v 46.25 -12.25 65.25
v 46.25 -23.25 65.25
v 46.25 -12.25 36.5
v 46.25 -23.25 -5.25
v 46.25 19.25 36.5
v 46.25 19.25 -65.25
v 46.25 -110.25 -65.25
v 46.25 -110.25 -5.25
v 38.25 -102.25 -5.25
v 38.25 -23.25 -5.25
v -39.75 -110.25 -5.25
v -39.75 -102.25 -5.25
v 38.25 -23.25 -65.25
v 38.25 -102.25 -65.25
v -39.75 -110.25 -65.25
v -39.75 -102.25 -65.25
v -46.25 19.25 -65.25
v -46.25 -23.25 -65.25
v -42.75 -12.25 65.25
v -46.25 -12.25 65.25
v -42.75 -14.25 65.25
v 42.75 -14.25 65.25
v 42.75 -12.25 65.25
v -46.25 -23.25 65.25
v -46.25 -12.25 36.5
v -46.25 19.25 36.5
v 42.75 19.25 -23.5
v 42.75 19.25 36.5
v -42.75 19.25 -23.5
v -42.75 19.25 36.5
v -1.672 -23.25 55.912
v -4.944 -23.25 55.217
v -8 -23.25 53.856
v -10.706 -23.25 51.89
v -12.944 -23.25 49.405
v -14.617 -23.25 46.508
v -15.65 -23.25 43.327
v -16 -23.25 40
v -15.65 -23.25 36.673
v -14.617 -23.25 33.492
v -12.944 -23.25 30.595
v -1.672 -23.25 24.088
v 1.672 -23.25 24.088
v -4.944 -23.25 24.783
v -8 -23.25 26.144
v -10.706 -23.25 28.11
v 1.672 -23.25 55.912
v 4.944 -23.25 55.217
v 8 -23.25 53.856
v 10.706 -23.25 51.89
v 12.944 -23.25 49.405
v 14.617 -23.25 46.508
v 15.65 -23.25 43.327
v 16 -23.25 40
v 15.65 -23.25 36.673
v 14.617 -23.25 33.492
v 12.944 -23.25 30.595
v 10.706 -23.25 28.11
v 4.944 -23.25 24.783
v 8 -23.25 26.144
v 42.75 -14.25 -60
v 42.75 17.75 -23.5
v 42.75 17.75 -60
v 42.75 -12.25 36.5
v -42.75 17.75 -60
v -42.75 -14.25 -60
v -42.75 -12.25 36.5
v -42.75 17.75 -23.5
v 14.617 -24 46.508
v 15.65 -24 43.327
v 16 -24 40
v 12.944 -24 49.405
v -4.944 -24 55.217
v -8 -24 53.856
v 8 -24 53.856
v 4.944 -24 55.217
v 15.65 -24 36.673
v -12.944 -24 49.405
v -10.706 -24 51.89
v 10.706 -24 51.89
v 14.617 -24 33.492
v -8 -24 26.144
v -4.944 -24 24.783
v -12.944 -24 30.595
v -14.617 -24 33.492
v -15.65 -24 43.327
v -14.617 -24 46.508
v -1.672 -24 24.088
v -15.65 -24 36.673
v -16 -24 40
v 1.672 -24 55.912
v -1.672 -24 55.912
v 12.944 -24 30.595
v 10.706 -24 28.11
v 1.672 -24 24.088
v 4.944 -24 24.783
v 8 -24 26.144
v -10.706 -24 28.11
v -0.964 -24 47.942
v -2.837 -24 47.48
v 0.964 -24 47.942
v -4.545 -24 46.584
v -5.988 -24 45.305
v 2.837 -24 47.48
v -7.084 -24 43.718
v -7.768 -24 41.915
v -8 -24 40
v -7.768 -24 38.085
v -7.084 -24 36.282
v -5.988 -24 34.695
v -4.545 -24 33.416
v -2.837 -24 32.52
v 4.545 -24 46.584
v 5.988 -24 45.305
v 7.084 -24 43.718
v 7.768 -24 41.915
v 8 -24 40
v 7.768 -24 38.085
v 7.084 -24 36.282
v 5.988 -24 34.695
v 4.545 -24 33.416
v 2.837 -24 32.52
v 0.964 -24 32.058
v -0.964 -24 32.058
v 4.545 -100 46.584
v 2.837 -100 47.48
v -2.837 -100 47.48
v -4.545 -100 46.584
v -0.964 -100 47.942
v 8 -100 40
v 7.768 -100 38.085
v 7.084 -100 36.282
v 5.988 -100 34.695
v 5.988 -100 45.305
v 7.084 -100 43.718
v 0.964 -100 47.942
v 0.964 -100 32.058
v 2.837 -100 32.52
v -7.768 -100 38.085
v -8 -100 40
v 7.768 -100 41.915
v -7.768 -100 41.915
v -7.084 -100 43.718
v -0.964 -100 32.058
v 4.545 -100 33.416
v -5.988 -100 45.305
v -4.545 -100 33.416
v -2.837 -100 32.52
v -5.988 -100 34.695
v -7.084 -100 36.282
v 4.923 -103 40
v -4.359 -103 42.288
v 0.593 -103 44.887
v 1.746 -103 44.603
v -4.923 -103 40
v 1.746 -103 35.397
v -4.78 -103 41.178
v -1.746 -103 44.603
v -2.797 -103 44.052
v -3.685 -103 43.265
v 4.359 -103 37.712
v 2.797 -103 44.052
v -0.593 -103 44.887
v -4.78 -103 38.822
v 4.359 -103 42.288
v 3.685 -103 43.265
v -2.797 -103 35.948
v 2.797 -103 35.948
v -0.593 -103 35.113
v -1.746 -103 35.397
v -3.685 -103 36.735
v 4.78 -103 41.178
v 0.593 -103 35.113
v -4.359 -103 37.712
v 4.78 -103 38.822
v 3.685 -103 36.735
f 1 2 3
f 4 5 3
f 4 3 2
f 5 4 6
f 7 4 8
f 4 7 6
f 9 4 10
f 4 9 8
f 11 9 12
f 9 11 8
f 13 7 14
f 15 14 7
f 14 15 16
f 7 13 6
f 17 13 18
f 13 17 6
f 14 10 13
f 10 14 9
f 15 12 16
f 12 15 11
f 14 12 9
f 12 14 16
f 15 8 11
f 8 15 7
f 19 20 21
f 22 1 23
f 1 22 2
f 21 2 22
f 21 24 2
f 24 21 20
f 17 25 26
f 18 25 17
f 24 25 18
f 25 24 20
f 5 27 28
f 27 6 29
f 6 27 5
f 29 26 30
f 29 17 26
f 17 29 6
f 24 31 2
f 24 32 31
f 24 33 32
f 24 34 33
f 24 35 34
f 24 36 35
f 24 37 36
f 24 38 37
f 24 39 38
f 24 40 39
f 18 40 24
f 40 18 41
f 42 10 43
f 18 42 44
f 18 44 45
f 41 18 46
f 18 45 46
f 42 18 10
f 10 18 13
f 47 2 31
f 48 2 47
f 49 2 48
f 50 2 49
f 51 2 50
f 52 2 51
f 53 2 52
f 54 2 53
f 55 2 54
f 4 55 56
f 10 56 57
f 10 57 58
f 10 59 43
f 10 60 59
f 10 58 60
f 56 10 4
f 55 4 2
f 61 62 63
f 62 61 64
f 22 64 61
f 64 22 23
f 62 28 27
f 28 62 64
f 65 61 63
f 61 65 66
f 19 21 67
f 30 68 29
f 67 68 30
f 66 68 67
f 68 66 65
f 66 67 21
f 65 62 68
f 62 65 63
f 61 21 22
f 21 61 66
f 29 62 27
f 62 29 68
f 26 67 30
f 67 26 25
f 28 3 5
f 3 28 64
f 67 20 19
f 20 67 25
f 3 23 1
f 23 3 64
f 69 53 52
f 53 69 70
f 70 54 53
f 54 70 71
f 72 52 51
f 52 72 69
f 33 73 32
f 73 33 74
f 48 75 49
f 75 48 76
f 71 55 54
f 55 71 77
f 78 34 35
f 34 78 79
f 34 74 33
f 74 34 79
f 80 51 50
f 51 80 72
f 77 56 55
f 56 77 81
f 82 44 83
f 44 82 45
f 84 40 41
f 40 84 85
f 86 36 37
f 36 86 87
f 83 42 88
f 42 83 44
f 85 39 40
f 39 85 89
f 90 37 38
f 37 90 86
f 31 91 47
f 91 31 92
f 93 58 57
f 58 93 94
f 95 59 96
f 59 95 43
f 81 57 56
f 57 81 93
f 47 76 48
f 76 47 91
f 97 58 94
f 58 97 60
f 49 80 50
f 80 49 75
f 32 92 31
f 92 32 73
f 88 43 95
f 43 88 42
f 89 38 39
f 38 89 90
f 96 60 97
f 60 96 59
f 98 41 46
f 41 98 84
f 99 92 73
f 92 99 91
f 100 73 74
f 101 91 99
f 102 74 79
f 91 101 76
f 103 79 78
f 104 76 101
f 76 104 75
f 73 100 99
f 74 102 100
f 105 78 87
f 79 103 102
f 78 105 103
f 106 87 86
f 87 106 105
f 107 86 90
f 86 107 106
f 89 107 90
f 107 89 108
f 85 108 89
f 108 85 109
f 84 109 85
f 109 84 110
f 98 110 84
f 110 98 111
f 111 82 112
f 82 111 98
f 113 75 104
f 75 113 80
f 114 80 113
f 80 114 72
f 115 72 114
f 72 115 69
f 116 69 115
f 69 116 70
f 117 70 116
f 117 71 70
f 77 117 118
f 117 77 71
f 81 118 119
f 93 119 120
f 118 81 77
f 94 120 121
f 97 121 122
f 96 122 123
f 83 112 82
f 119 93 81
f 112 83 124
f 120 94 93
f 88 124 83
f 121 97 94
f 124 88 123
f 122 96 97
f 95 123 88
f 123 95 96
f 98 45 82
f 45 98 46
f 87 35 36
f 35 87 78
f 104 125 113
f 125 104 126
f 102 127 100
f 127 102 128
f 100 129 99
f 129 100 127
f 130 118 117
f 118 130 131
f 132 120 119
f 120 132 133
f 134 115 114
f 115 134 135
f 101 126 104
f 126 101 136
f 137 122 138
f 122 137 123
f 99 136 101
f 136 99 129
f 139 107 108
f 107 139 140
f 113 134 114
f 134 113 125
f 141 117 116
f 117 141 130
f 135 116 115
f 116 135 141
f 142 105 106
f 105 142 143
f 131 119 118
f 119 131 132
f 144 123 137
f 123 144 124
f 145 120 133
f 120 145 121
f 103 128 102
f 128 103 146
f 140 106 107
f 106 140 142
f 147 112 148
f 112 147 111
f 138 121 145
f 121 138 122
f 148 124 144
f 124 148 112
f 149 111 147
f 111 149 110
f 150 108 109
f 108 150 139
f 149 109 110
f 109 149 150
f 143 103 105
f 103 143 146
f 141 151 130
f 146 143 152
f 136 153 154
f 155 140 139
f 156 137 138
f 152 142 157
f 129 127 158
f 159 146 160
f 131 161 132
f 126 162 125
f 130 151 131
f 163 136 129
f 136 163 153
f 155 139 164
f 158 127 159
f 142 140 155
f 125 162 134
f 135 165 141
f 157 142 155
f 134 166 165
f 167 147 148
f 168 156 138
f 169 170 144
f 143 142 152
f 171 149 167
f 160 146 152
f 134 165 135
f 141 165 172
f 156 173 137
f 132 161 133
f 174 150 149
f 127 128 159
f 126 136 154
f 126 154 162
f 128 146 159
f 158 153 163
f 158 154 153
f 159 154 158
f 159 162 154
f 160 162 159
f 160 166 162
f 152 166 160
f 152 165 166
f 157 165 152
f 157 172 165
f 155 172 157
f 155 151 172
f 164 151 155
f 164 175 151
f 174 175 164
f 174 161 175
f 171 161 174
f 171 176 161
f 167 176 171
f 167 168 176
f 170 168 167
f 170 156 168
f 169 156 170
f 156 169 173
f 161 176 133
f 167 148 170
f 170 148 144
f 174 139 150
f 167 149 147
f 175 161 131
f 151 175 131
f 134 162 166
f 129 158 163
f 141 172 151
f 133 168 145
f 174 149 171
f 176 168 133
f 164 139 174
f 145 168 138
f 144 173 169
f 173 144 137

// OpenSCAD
postWidth=78;
holeDiameter=16;
phoneWidth=85.5;
phoneHeight=127;
phoneDepth=32;
holderWidth=3.5;

union() {
    rackMount();
    phoneHolder();
        
    translate([0, -22, 40])
    rotate([90, 0, 0])
    post();
}

module rackMount() {
    bracketWidth=8;
    bracketHeight=60;
    bracketDepth=10;
    
    union() {
        translate([phoneWidth/2 - bracketWidth/2 + holderWidth, -66, -35.25])
        cube([bracketWidth, postWidth+bracketWidth, bracketHeight], true);    
        
        translate([3.25, -postWidth -28.25, -35.25])
        cube([postWidth+bracketWidth, bracketWidth, bracketHeight], true);
    }
}

module post() {
    union() {
        cylinder(h=2, d=holeDiameter*2);
        cylinder(h=postWidth, d=holeDiameter);
        translate([0, 0, postWidth])
        cylinder(h=3, d1=holeDiameter, d2=holeDiameter/1.625);
    }
}

module phoneHolder() {
    
    difference(){
        translate([0, -2, 0])
        cube([phoneWidth+holderWidth*2, phoneDepth+holderWidth*3, phoneHeight+holderWidth], true);
        
        translate([0, holderWidth/2, holderWidth])
        cube([phoneWidth, phoneDepth, phoneHeight], true);
        
        translate([0, holderWidth*2, 40])
        cube([phoneWidth, phoneDepth, phoneHeight], true);
        
        translate([0, holderWidth/2+4, 100])
        cube([phoneWidth*2, phoneDepth+4, phoneHeight], true);
    }
}
